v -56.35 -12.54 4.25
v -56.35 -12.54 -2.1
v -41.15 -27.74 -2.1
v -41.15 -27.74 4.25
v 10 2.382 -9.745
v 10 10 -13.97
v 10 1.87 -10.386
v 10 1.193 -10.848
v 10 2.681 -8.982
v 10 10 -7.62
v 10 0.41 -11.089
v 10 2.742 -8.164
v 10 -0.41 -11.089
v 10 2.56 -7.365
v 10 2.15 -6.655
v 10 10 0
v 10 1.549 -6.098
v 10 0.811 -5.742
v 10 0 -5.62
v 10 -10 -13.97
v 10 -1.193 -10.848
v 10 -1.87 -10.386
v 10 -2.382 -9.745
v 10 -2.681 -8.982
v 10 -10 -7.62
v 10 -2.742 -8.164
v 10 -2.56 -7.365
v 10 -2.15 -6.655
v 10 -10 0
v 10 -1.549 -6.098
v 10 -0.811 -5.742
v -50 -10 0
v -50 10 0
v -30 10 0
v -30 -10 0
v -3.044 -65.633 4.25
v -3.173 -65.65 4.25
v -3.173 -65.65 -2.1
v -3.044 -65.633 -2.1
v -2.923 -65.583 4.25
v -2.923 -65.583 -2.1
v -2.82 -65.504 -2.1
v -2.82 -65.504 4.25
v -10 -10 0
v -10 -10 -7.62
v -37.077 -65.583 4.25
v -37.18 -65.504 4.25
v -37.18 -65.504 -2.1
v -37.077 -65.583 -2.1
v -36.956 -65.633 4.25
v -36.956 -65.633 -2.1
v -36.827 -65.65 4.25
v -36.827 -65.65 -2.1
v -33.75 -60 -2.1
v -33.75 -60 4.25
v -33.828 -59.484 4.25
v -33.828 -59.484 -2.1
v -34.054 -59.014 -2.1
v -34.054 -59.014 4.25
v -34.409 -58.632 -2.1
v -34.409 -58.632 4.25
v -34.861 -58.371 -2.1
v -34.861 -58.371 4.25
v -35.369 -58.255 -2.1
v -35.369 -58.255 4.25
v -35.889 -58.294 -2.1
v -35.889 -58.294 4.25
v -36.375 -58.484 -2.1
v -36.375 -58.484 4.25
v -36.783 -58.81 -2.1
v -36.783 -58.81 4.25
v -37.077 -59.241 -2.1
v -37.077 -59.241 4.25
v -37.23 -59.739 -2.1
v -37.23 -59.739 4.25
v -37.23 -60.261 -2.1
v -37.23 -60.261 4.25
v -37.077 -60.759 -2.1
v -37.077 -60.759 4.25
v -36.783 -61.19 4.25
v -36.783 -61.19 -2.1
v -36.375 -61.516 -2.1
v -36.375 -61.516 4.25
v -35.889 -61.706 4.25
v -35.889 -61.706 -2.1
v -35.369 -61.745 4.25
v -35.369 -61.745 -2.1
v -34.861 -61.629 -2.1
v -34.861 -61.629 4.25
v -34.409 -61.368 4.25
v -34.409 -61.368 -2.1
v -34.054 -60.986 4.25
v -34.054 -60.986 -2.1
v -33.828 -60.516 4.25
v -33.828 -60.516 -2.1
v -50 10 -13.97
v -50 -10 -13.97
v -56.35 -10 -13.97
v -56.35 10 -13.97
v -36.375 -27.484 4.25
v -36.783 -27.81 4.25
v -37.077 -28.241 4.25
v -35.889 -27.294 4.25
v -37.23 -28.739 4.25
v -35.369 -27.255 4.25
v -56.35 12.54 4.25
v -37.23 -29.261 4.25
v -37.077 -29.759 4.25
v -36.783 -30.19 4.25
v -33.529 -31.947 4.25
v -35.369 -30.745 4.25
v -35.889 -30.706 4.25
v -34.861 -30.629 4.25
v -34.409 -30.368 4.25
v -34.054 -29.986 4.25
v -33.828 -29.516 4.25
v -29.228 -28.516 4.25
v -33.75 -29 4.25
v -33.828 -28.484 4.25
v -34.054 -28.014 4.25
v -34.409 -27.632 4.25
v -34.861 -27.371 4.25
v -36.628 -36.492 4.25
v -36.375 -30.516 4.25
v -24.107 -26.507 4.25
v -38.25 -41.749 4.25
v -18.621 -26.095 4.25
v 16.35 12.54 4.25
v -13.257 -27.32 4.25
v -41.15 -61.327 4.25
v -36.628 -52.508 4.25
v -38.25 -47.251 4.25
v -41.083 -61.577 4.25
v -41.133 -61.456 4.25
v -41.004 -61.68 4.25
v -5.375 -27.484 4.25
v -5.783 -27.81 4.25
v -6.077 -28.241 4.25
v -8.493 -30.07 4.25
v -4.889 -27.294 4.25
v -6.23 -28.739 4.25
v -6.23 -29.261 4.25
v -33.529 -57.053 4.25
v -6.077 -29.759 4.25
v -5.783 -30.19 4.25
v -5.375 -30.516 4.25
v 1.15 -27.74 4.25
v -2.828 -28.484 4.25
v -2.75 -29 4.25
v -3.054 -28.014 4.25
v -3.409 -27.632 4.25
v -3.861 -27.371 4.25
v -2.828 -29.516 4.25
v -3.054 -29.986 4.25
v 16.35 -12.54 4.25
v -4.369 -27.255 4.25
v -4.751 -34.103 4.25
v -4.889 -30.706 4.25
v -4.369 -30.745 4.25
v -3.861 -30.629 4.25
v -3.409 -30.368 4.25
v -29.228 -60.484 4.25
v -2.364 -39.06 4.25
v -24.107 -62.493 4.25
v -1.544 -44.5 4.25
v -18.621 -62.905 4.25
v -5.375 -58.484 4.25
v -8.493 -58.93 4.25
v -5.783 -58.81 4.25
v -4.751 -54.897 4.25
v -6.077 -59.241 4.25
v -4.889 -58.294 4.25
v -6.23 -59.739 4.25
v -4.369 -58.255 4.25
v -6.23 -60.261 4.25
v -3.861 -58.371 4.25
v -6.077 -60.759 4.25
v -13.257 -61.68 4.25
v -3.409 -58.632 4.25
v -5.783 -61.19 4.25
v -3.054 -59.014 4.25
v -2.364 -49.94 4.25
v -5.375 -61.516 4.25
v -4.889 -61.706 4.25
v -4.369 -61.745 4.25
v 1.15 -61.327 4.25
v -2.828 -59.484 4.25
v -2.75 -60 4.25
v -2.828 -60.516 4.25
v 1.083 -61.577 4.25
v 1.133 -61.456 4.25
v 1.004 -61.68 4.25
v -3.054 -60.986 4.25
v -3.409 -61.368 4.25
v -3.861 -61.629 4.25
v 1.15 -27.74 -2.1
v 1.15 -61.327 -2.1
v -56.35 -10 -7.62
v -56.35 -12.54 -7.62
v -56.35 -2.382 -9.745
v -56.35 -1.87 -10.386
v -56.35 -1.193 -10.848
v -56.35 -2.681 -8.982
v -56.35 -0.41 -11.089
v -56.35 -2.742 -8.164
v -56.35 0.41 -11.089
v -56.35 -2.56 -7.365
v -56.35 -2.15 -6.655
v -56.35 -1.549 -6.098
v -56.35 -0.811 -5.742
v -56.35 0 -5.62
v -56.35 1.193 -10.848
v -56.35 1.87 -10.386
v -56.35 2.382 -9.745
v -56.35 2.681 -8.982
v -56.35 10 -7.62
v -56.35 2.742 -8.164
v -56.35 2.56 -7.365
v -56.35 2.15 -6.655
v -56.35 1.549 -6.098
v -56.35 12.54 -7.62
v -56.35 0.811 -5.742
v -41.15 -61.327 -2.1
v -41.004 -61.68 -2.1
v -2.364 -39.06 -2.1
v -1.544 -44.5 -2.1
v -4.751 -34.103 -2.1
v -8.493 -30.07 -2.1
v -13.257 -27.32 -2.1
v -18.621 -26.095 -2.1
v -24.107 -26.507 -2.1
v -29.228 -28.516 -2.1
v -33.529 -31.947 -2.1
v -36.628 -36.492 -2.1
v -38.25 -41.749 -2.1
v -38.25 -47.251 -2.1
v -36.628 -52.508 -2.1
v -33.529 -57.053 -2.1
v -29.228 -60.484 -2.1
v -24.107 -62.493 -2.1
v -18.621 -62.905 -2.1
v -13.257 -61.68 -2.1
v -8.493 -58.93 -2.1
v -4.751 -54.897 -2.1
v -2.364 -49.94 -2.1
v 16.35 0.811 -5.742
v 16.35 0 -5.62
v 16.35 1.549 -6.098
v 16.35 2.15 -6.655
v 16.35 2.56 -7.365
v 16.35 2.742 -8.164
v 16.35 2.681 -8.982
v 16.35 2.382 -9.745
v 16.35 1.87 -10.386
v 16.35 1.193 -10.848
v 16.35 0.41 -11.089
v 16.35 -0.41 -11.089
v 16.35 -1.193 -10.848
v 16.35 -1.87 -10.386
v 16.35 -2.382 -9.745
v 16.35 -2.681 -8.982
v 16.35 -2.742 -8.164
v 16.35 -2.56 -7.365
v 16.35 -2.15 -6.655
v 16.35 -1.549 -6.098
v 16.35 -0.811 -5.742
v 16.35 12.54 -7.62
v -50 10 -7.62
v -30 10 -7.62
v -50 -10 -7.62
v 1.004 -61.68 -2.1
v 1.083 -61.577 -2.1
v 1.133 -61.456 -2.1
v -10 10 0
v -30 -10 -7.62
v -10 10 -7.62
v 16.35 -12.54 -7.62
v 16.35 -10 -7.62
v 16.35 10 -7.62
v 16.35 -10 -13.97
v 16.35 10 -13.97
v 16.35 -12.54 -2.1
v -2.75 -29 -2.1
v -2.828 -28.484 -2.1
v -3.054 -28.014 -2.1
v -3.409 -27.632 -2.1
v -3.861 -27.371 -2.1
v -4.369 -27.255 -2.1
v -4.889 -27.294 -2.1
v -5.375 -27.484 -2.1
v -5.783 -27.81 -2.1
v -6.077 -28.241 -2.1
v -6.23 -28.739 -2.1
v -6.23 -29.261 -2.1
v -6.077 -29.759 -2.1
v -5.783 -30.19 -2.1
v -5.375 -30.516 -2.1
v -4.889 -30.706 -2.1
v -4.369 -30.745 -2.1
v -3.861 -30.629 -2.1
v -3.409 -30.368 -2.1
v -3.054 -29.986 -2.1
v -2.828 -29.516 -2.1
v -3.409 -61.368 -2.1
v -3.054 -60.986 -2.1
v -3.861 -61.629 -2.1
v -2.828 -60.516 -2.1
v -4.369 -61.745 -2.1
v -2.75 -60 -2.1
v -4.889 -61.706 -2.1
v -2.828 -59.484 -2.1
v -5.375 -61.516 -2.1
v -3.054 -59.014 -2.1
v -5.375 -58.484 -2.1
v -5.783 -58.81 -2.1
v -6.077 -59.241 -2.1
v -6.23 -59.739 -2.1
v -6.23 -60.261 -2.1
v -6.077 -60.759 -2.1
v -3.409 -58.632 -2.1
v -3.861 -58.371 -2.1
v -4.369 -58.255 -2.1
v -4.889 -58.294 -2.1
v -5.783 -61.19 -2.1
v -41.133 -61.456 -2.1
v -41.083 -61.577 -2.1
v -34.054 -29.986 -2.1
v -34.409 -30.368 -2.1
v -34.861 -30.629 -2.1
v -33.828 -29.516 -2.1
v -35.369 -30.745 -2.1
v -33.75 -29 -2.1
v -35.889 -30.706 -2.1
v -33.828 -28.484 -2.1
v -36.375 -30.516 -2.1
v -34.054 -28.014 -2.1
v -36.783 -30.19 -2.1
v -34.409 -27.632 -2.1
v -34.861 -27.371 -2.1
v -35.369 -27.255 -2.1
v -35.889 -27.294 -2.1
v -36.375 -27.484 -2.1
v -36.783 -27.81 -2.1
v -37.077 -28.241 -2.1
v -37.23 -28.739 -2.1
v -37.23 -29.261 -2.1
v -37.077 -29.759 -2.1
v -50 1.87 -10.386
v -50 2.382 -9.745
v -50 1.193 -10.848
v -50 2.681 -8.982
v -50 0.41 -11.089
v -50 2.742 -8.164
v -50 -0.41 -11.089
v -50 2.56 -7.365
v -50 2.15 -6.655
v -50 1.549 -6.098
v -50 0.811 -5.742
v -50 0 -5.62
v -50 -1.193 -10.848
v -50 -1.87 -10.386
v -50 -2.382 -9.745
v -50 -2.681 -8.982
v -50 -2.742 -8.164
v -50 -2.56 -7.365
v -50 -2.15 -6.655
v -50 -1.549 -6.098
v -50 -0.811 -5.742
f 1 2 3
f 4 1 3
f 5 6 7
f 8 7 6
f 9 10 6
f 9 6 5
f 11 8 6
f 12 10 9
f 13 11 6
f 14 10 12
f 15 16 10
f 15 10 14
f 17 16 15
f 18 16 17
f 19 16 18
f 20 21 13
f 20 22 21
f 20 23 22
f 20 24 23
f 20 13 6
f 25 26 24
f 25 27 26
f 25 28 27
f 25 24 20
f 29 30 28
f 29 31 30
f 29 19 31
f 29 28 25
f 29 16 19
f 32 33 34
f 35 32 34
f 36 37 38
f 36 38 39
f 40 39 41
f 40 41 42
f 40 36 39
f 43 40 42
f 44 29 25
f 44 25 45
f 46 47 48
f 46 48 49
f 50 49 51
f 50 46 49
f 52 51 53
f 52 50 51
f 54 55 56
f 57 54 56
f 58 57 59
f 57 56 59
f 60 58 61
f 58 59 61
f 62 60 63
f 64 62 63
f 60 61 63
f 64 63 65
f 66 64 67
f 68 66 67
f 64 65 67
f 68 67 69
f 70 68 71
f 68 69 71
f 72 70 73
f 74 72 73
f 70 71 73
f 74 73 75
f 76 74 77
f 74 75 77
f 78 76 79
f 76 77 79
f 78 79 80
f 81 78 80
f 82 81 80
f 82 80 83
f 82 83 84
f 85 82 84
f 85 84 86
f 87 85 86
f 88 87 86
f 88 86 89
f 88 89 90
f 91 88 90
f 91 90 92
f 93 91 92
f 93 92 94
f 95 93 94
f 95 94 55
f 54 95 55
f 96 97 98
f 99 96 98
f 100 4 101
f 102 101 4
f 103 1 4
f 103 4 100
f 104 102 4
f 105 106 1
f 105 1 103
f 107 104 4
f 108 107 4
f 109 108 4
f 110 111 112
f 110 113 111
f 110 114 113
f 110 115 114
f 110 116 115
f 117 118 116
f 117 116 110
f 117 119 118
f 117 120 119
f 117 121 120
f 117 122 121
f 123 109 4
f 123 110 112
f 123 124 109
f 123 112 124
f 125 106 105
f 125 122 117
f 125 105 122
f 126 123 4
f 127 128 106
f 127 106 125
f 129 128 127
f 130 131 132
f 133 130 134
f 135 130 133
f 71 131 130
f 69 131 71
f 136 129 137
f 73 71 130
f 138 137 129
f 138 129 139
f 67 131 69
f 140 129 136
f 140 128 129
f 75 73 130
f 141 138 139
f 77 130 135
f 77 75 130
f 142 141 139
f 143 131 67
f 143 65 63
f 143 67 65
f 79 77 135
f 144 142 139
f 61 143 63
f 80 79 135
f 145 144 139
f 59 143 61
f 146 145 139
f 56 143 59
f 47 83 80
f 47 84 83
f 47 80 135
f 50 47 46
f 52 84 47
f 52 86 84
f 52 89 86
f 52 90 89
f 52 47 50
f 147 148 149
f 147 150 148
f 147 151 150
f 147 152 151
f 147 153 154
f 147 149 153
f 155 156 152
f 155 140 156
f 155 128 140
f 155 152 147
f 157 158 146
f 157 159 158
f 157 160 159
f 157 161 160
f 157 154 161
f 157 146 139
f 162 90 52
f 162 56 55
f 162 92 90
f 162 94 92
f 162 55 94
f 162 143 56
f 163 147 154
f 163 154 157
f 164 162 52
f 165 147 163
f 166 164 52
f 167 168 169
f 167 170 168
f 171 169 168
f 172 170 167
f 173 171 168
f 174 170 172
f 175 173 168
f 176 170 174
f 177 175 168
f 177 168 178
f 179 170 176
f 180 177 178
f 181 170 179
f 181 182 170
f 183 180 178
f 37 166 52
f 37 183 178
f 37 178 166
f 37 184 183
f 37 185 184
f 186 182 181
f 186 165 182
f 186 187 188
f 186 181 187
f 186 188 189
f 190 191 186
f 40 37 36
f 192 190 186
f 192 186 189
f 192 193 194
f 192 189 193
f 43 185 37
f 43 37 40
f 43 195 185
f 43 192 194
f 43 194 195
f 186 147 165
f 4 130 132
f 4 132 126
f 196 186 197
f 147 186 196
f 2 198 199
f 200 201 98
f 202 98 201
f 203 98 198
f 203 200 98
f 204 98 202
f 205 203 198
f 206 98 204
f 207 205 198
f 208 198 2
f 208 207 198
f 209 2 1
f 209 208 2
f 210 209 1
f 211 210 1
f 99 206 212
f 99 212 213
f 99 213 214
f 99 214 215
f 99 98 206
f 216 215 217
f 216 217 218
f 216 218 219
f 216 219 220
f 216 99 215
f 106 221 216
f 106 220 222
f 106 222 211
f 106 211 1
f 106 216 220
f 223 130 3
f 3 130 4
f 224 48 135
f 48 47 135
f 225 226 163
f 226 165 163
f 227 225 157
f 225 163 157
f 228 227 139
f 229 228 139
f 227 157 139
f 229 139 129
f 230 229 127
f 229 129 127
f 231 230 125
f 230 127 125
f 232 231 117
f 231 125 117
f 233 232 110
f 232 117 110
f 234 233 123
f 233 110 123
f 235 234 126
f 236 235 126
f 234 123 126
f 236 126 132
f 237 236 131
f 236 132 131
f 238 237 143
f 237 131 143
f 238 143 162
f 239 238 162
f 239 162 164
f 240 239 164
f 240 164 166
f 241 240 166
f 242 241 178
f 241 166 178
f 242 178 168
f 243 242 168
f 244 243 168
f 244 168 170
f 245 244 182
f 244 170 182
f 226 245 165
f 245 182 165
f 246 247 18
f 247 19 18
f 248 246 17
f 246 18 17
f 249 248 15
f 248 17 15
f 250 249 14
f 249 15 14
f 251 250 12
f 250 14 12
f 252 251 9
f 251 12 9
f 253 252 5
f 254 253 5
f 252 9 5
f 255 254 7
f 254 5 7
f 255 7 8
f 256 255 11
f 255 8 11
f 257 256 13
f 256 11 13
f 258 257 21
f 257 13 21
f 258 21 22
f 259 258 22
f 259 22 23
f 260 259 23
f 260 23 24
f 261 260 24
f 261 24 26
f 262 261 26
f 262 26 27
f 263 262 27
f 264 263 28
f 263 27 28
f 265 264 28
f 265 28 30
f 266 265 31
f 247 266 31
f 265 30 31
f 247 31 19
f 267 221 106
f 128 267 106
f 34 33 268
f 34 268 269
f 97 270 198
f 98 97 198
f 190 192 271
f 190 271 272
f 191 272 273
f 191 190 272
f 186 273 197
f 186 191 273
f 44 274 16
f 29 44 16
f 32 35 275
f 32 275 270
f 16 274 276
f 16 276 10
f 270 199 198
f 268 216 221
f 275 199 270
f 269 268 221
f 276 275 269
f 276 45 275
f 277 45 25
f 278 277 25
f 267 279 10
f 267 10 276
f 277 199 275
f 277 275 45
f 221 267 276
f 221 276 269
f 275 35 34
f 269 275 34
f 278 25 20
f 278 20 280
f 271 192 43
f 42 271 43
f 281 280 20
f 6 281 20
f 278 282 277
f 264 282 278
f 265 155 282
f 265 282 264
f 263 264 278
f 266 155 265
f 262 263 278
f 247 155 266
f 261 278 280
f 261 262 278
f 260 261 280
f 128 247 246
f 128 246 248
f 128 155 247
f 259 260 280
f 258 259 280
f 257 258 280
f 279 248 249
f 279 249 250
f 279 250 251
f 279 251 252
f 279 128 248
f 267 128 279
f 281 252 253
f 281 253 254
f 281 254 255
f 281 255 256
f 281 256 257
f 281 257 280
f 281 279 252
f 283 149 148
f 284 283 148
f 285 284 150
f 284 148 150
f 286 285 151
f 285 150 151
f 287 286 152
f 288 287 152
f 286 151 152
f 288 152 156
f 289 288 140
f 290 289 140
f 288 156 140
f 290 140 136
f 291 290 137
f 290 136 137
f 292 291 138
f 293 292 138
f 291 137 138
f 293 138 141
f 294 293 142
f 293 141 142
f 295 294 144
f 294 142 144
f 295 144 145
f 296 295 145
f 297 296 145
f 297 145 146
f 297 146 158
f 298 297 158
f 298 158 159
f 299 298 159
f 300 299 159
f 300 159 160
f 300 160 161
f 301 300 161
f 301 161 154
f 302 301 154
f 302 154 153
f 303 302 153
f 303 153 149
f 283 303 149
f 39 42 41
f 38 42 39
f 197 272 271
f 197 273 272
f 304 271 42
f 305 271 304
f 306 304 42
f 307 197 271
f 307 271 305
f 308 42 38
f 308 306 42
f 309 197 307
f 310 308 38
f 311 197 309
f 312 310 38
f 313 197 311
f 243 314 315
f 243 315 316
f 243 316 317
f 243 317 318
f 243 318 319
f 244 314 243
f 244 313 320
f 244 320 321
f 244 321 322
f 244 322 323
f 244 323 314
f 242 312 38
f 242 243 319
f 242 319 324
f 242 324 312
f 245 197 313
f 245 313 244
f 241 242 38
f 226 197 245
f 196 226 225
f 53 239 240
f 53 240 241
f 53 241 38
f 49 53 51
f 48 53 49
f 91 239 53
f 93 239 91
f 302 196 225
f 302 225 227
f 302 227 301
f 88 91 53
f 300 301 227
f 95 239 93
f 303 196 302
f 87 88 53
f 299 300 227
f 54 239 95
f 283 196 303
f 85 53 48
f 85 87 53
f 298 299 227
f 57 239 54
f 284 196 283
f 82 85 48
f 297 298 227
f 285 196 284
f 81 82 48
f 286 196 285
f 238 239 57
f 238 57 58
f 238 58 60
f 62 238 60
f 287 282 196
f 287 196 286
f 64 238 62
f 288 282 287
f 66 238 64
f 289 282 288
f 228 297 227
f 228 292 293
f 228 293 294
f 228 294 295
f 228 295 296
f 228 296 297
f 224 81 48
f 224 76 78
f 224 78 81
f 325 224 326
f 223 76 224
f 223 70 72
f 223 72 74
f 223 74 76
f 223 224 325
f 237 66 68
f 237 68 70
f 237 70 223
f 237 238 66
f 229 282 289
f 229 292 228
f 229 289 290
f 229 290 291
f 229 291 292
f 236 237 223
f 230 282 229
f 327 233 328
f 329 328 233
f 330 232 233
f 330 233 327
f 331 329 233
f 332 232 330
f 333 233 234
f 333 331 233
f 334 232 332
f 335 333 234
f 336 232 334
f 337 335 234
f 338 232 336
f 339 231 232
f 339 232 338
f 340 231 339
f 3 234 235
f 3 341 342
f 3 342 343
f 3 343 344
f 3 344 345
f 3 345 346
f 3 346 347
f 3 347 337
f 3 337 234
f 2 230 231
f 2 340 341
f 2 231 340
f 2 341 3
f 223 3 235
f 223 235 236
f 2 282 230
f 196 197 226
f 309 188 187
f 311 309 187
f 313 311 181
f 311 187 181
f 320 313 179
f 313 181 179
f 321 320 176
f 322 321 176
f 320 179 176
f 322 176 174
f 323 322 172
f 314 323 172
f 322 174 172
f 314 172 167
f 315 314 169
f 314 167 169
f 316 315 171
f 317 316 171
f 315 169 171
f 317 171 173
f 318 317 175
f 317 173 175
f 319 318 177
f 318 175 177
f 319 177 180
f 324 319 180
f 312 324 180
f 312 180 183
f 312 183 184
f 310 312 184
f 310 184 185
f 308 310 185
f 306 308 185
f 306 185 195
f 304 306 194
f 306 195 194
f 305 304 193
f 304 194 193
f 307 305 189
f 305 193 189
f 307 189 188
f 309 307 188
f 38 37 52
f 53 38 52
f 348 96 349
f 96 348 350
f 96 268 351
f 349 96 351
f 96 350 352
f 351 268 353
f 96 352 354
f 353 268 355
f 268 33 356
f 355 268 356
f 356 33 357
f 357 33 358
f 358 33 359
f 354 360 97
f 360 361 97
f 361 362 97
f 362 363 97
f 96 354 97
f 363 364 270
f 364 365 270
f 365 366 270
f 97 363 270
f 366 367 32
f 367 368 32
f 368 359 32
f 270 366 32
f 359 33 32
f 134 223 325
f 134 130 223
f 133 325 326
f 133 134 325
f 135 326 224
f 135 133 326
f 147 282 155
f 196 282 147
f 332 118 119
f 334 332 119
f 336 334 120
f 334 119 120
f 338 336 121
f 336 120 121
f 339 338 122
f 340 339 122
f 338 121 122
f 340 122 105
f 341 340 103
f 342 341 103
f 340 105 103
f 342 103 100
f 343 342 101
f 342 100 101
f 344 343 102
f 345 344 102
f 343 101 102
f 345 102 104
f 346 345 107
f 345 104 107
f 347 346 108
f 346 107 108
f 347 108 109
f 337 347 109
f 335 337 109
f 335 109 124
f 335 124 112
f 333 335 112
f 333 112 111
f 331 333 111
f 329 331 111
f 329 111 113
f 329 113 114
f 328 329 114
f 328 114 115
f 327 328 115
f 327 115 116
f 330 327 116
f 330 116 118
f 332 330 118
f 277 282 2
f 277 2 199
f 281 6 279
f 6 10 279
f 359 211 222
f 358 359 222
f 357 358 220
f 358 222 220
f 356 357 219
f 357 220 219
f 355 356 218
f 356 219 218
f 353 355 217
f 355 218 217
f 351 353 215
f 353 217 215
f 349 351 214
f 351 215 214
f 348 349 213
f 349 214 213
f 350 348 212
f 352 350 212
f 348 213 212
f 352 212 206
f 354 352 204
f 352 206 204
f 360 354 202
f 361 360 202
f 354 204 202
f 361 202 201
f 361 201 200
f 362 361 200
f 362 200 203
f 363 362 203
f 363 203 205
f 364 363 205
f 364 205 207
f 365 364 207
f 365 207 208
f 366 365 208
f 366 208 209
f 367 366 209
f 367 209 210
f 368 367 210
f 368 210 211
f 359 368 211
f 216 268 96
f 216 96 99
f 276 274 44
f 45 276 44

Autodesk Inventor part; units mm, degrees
ref_plane "YZ Plane" through (0, 0, 0) normal (1, 0, 0) x (0, 1, 0)
ref_plane "XZ Plane" through (0, 0, 0) normal (0, 1, 0) x (-1, 0, 0)
ref_plane "XY Plane" through (0, 0, 0) normal (0, 0, 1) x (1, 0, 0)
sketch "Sketch1" plane through (0, 0, 0) normal (0, 0, 1) x (1, 0, 0)
  circle A0 centre (-40, 0) radius 2.5 projected
  arc A1 (-31.25, -10) -> (-30, -8.75) centre (-31.25, -8.75) ccw projected
  line L0 (-30, -3.6) -> (-30, -8.75) projected
  line L1 (-30.5, -3.1) -> (-30, -3.6) projected
  line L2 (-31.6, -3.1) -> (-30.5, -3.1) projected
  line L3 (-31.6, -5.5) -> (-31.6, -3.1) projected
  line L4 (-33.534, -5.5) -> (-31.6, -5.5) projected
  line L5 (-35.9, -3.134) -> (-33.534, -5.5) projected
  line L6 (-35.9, 3.134) -> (-35.9, -3.134) projected
  line L7 (-33.534, 5.5) -> (-35.9, 3.134) projected
  line L8 (-31.6, 5.5) -> (-33.534, 5.5) projected
  line L9 (-31.6, 3.1) -> (-31.6, 5.5) projected
  line L10 (-30.5, 3.1) -> (-31.6, 3.1) projected
  line L11 (-30, 3.6) -> (-30.5, 3.1) projected
  line L12 (-30, 8.75) -> (-30, 3.6) projected
  arc A2 (-30, 8.75) -> (-31.25, 10) centre (-31.25, 8.75) ccw projected
  line L13 (-36.4, 10) -> (-31.25, 10) projected
  line L14 (-36.9, 9.5) -> (-36.4, 10) projected
  line L15 (-36.9, 8.4) -> (-36.9, 9.5) projected
  line L16 (-34.5, 8.4) -> (-36.9, 8.4) projected
  line L17 (-34.5, 6.466) -> (-34.5, 8.4) projected
  line L18 (-36.866, 4.1) -> (-34.5, 6.466) projected
  line L19 (-43.134, 4.1) -> (-36.866, 4.1) projected
  line L20 (-45.5, 6.466) -> (-43.134, 4.1) projected
  line L21 (-45.5, 8.4) -> (-45.5, 6.466) projected
  line L22 (-43.1, 8.4) -> (-45.5, 8.4) projected
  line L23 (-43.1, 9.5) -> (-43.1, 8.4) projected
  line L24 (-43.6, 10) -> (-43.1, 9.5) projected
  line L25 (-48.75, 10) -> (-43.6, 10) projected
  arc A3 (-48.75, 10) -> (-50, 8.75) centre (-48.75, 8.75) ccw projected
  line L26 (-50, 3.6) -> (-50, 8.75) projected
  line L27 (-49.5, 3.1) -> (-50, 3.6) projected
  line L28 (-48.4, 3.1) -> (-49.5, 3.1) projected
  line L29 (-48.4, 5.5) -> (-48.4, 3.1) projected
  line L30 (-46.466, 5.5) -> (-48.4, 5.5) projected
  line L31 (-44.1, 3.134) -> (-46.466, 5.5) projected
  line L32 (-44.1, -3.134) -> (-44.1, 3.134) projected
  line L33 (-46.466, -5.5) -> (-44.1, -3.134) projected
  line L34 (-48.4, -5.5) -> (-46.466, -5.5) projected
  line L35 (-48.4, -3.1) -> (-48.4, -5.5) projected
  line L36 (-49.5, -3.1) -> (-48.4, -3.1) projected
  line L37 (-50, -3.6) -> (-49.5, -3.1) projected
  line L38 (-50, -8.75) -> (-50, -3.6) projected
  arc A4 (-50, -8.75) -> (-48.75, -10) centre (-48.75, -8.75) ccw projected
  line L39 (-43.6, -10) -> (-48.75, -10) projected
  line L40 (-43.1, -9.5) -> (-43.6, -10) projected
  line L41 (-43.1, -8.4) -> (-43.1, -9.5) projected
  line L42 (-45.5, -8.4) -> (-43.1, -8.4) projected
  line L43 (-45.5, -6.466) -> (-45.5, -8.4) projected
  line L44 (-43.134, -4.1) -> (-45.5, -6.466) projected
  line L45 (-36.866, -4.1) -> (-43.134, -4.1) projected
  line L46 (-34.5, -6.466) -> (-36.866, -4.1) projected
  line L47 (-34.5, -8.4) -> (-34.5, -6.466) projected
  line L48 (-36.9, -8.4) -> (-34.5, -8.4) projected
  line L49 (-36.9, -9.5) -> (-36.9, -8.4) projected
  line L50 (-36.4, -10) -> (-36.9, -9.5) projected
  line L51 (-31.25, -10) -> (-36.4, -10) projected
  circle A5 centre (0, 0) radius 2.5 projected
  arc A6 (8.75, -10) -> (10, -8.75) centre (8.75, -8.75) ccw projected
  line L52 (10, -3.6) -> (10, -8.75) projected
  line L53 (9.5, -3.1) -> (10, -3.6) projected
  line L54 (8.4, -3.1) -> (9.5, -3.1) projected
  line L55 (8.4, -5.5) -> (8.4, -3.1) projected
  line L56 (6.466, -5.5) -> (8.4, -5.5) projected
  line L57 (4.1, -3.134) -> (6.466, -5.5) projected
  line L58 (4.1, 3.134) -> (4.1, -3.134) projected
  line L59 (6.466, 5.5) -> (4.1, 3.134) projected
  line L60 (8.4, 5.5) -> (6.466, 5.5) projected
  line L61 (8.4, 3.1) -> (8.4, 5.5) projected
  line L62 (9.5, 3.1) -> (8.4, 3.1) projected
  line L63 (10, 3.6) -> (9.5, 3.1) projected
  line L64 (10, 8.75) -> (10, 3.6) projected
  arc A7 (10, 8.75) -> (8.75, 10) centre (8.75, 8.75) ccw projected
  line L65 (3.6, 10) -> (8.75, 10) projected
  line L66 (3.1, 9.5) -> (3.6, 10) projected
  line L67 (3.1, 8.4) -> (3.1, 9.5) projected
  line L68 (5.5, 8.4) -> (3.1, 8.4) projected
  line L69 (5.5, 6.466) -> (5.5, 8.4) projected
  line L70 (3.134, 4.1) -> (5.5, 6.466) projected
  line L71 (-3.134, 4.1) -> (3.134, 4.1) projected
  line L72 (-5.5, 6.466) -> (-3.134, 4.1) projected
  line L73 (-5.5, 8.4) -> (-5.5, 6.466) projected
  line L74 (-3.1, 8.4) -> (-5.5, 8.4) projected
  line L75 (-3.1, 9.5) -> (-3.1, 8.4) projected
  line L76 (-3.6, 10) -> (-3.1, 9.5) projected
  line L77 (-8.75, 10) -> (-3.6, 10) projected
  arc A8 (-8.75, 10) -> (-10, 8.75) centre (-8.75, 8.75) ccw projected
  line L78 (-10, 3.6) -> (-10, 8.75) projected
  line L79 (-9.5, 3.1) -> (-10, 3.6) projected
  line L80 (-8.4, 3.1) -> (-9.5, 3.1) projected
  line L81 (-8.4, 5.5) -> (-8.4, 3.1) projected
  line L82 (-6.466, 5.5) -> (-8.4, 5.5) projected
  line L83 (-4.1, 3.134) -> (-6.466, 5.5) projected
  line L84 (-4.1, -3.134) -> (-4.1, 3.134) projected
  line L85 (-6.466, -5.5) -> (-4.1, -3.134) projected
  line L86 (-8.4, -5.5) -> (-6.466, -5.5) projected
  line L87 (-8.4, -3.1) -> (-8.4, -5.5) projected
  line L88 (-9.5, -3.1) -> (-8.4, -3.1) projected
  line L89 (-10, -3.6) -> (-9.5, -3.1) projected
  line L90 (-10, -8.75) -> (-10, -3.6) projected
  arc A9 (-10, -8.75) -> (-8.75, -10) centre (-8.75, -8.75) ccw projected
  line L91 (-3.6, -10) -> (-8.75, -10) projected
  line L92 (-3.1, -9.5) -> (-3.6, -10) projected
  line L93 (-3.1, -8.4) -> (-3.1, -9.5) projected
  line L94 (-5.5, -8.4) -> (-3.1, -8.4) projected
  line L95 (-5.5, -6.466) -> (-5.5, -8.4) projected
  line L96 (-3.134, -4.1) -> (-5.5, -6.466) projected
  line L97 (3.134, -4.1) -> (-3.134, -4.1) projected
  line L98 (5.5, -6.466) -> (3.134, -4.1) projected
  line L99 (5.5, -8.4) -> (5.5, -6.466) projected
  line L100 (3.1, -8.4) -> (5.5, -8.4) projected
  line L101 (3.1, -9.5) -> (3.1, -8.4) projected
  line L102 (3.6, -10) -> (3.1, -9.5) projected
  line L103 (8.75, -10) -> (3.6, -10) projected
  line L104 (-50, -10) -> (-50, 10)
  line L105 (10, 10) -> (10, -10)
  line L106 (-30, -10) -> (-30, 10)
  line L107 (-10, 10) -> (-10, -10)
  line L108 (-52.54, -12.54) -> (12.54, -12.54)
  line L109 (12.54, -12.54) -> (12.54, 12.54)
  line L110 (12.54, 12.54) -> (-52.54, 12.54)
  line L111 (-52.54, 12.54) -> (-52.54, -12.54)
  line L112 (10, -10) -> (-10, -10)
  line L113 (-30, -10) -> (-50, -10)
  line L114 (-50, 10) -> (-30, 10)
  line L115 (-10, 10) -> (10, 10)
  point P0 (0, 0)
extrude "Extrusion1" add sketch "Sketch1" against normal blind 7.62 contours L111 L110 L109 L108
sketch "Sketch2" plane through (0, 0, 0) normal (0, 0, 1) x (1, 0, 0)
  line L0 (-52.54, -12.54) -> (-52.54, 12.54) projected
  line L1 (12.54, -12.54) -> (12.54, 12.54) projected
  line L2 (-52.54, -12.54) -> (12.54, -12.54)
  line L3 (12.54, -12.54) -> (12.54, 12.54)
  line L4 (12.54, 12.54) -> (-52.54, 12.54)
  line L5 (-52.54, 12.54) -> (-52.54, -12.54)
  point P0 (0, 0)
extrude "Extrusion2" add sketch "Sketch2" along normal blind 4.25
sketch "Sketch4" plane through (0, 0, 4.25) normal (0, 0, 1) x (1, 0, 0)
  line L0 (-52.54, -12.54) -> (12.54, -12.54) projected
  line L1 (12.54, -12.54) -> (12.54, 12.54) projected
  line L2 (12.54, 12.54) -> (-52.54, 12.54) projected
  line L3 (-52.54, 12.54) -> (-52.54, -12.54) projected
  line L4 (-36.8267, -23.35) -> (-3.1733, -23.35) projected
  arc A0 (-2.8198, -23.4964) -> (-3.1733, -23.35) centre (-3.1733, -23.85) ccw projected
  line L5 (-2.8198, -23.4964) -> (1.0036, -27.3198) projected
  arc A1 (1.15, -27.6733) -> (1.0036, -27.3198) centre (0.65, -27.6733) ccw projected
  line L6 (1.15, -27.6733) -> (1.15, -61.3267) projected
  arc A2 (1.0036, -61.6802) -> (1.15, -61.3267) centre (0.65, -61.3267) ccw projected
  line L7 (1.0036, -61.6802) -> (-2.8198, -65.5036) projected
  arc A3 (-3.1733, -65.65) -> (-2.8198, -65.5036) centre (-3.1733, -65.15) ccw projected
  line L8 (-3.1733, -65.65) -> (-36.8267, -65.65) projected
  arc A4 (-37.1802, -65.5036) -> (-36.8267, -65.65) centre (-36.8267, -65.15) ccw projected
  line L9 (-37.1802, -65.5036) -> (-41.0036, -61.6802) projected
  arc A5 (-41.15, -61.3267) -> (-41.0036, -61.6802) centre (-40.65, -61.3267) ccw projected
  line L10 (-41.15, -61.3267) -> (-41.15, -27.6733) projected
  arc A6 (-41.0036, -27.3198) -> (-41.15, -27.6733) centre (-40.65, -27.6733) ccw projected
  line L11 (-41.0036, -27.3198) -> (-37.1802, -23.4964) projected
  arc A7 (-36.8267, -23.35) -> (-37.1802, -23.4964) centre (-36.8267, -23.85) ccw projected
  circle A8 centre (-4.5, -29) radius 1.75 projected
  circle A9 centre (-35.5, -29) radius 1.75 projected
  circle A10 centre (-35.5, -60) radius 1.75 projected
  circle A11 centre (-4.5, -60) radius 1.75 projected
  circle A12 centre (-20, -44.5) radius 17 projected
  line L12 (-41.15, -27.6733) -> (-41.15, -12.54)
  line L13 (-51.3494, -12.54) -> (11.3494, -12.54) projected
  line L14 (1.15, -27.6733) -> (1.15, -12.54)
  circle A13 centre (-20, -44.5) radius 18.4562
  point P0 (0, 0)
extrude "Extrusion3" add sketch "Sketch4" against normal blind 6.35 contours L0 L14 A1 L5 A0 L4 A7 L11 A6 L12 | A6 L11 A7 L4 A0 L5 A1 L6 A2 L7 A3 L8 A4 L9 A5 L10
sketch "Sketch7" plane through (12.54, -12.54, -7.62) normal (1, 0, 0) x (0, 0, -1)
  line L0 (-7.62, 22.54) -> (-7.62, 2.54) projected
  line L1 (0, 0) -> (-11.87, 0) projected
  line L2 (0, 25.08) -> (0, 0) projected
  line L3 (0, 25.08) -> (-11.87, 25.08) projected
  line L4 (-11.87, 0) -> (-11.87, 25.08) projected
  point P0 (-7.62, 12.54)
extrude "Extrusion5" add sketch "Sketch7" along normal blind 3.81
sketch "Sketch8" plane through (-52.54, -12.54, -7.62) normal (-1, 0, 0) x (0, 0, 1)
  line L0 (0, 25.08) -> (11.87, 25.08) projected
  line L1 (0, 0) -> (0, 25.08) projected
  line L2 (11.87, 0) -> (0, 0) projected
  line L3 (11.87, 25.08) -> (11.87, 0) projected
  point P0 (7.62, 12.54)
extrude "Extrusion6" add sketch "Sketch8" along normal blind 3.81
sketch "Sketch9" plane through (0, 0, -2.1) normal (0, 0, -1) x (-1, 0, 0)
  line L0 (-1.15, -12.54) -> (-16.35, -12.54) projected
  line L1 (-16.35, -12.54) -> (-1.15, -27.74)
  line L2 (56.35, -12.54) -> (56.35, 12.54) projected
  line L3 (56.35, -12.54) -> (41.15, -27.74)
  line L4 (41.15, -12.54) -> (41.15, -61.3267) projected
  line L5 (-1.15, -12.54) -> (-1.15, -61.3267) projected
  line L6 (-1.15, -12.54) -> (41.15, -12.54) projected
  line L7 (41.15, -12.54) -> (56.35, -12.54) projected
  line L8 (41.15, -12.54) -> (56.35, -12.54)
  line L9 (41.15, -12.54) -> (41.15, -27.74)
  line L10 (-1.15, -61.3267) -> (-1.15, -12.54) projected
  line L11 (-1.15, -27.74) -> (-1.15, -12.54)
  line L12 (-1.15, -12.54) -> (-16.35, -12.54)
  point P0 (0, 0)
  dimension "d16" = 45
  dimension "d17" = 45
extrude "Extrusion7" add sketch "Sketch9" against normal up to surface (6.35 mm away)
sketch "Sketch10" plane through (0, 0, -7.62) normal (0, 0, -1) x (-1, 0, 0)
  line L0 (-16.35, 12.54) -> (-16.35, -12.54) projected
  line L1 (-10, 10) -> (-10, -10)
  line L2 (-10, -10) -> (-16.35, -10)
  line L3 (-16.35, -10) -> (-16.35, 10)
  line L4 (56.35, 12.54) -> (56.35, -12.54) projected
  line L5 (50, 10) -> (50, -10)
  line L6 (50, -10) -> (56.35, -10)
  line L7 (56.35, -10) -> (56.35, 10)
  line L8 (-10, -10) -> (-10, 10) projected
  line L9 (50, 10) -> (50, -10) projected
  line L10 (10, -10) -> (-10, -10) projected
  line L11 (-10, 10) -> (10, 10) projected
  line L12 (-10, 10) -> (-16.35, 10)
  line L13 (30, 10) -> (50, 10) projected
  line L14 (50, 10) -> (56.35, 10)
  point P0 (0, 0)
  dimension "d20" = 0
  dimension "d21" = 0
  dimension "d30" = 0
extrude "Extrusion8" add sketch "Sketch10" along normal blind 6.35
sketch "Sketch11" plane through (-56.35, -12.54, -7.62) normal (-1, 0, 0) x (0, 0, 1)
  line L0 (5.52, 2.54) -> (-6.35, 2.54) projected
  line L1 (-6.35, 2.54) -> (15.282, 2.54)
  line L2 (-6.35, 2.54) -> (-6.35, 22.54) projected
  line L3 (-6.35, 22.54) -> (2.1036, 22.54)
  line L4 (7.62, 22.54) -> (0, 22.54) projected
  circle A0 centre (-0.7499, 12.54) radius 2.75
  line L5 (-0.7499, 12.54) -> (-0.7499, 22.54)
  line L6 (-0.7499, 12.54) -> (-0.7499, 2.54)
  line L7 (0, 2.54) -> (-6.35, 2.54) projected
  point P0 (7.62, 12.54)
  point P1 (5.52, 0)
  dimension "d32" = 5.5
extrude "Extrusion9" cut sketch "Sketch11" against normal through all contours L6 L5 A0 | A0 L5 L6
sketch "Sketch12" plane through (-30, -10, 0) normal (-1, 0, 0) x (0, 0, 1)
  arc A0 (-7.62, 7.3542) -> (-7.62, 12.6458) centre (-8.3699, 10) ccw projected
  line L0 (-7.62, 7.3542) -> (-7.62, 12.6458)
  point P0 (0, 10)
extrude "Extrusion10" add sketch "Sketch12" against normal up to surface (20 mm away)
properties part number "motorBracketY"
